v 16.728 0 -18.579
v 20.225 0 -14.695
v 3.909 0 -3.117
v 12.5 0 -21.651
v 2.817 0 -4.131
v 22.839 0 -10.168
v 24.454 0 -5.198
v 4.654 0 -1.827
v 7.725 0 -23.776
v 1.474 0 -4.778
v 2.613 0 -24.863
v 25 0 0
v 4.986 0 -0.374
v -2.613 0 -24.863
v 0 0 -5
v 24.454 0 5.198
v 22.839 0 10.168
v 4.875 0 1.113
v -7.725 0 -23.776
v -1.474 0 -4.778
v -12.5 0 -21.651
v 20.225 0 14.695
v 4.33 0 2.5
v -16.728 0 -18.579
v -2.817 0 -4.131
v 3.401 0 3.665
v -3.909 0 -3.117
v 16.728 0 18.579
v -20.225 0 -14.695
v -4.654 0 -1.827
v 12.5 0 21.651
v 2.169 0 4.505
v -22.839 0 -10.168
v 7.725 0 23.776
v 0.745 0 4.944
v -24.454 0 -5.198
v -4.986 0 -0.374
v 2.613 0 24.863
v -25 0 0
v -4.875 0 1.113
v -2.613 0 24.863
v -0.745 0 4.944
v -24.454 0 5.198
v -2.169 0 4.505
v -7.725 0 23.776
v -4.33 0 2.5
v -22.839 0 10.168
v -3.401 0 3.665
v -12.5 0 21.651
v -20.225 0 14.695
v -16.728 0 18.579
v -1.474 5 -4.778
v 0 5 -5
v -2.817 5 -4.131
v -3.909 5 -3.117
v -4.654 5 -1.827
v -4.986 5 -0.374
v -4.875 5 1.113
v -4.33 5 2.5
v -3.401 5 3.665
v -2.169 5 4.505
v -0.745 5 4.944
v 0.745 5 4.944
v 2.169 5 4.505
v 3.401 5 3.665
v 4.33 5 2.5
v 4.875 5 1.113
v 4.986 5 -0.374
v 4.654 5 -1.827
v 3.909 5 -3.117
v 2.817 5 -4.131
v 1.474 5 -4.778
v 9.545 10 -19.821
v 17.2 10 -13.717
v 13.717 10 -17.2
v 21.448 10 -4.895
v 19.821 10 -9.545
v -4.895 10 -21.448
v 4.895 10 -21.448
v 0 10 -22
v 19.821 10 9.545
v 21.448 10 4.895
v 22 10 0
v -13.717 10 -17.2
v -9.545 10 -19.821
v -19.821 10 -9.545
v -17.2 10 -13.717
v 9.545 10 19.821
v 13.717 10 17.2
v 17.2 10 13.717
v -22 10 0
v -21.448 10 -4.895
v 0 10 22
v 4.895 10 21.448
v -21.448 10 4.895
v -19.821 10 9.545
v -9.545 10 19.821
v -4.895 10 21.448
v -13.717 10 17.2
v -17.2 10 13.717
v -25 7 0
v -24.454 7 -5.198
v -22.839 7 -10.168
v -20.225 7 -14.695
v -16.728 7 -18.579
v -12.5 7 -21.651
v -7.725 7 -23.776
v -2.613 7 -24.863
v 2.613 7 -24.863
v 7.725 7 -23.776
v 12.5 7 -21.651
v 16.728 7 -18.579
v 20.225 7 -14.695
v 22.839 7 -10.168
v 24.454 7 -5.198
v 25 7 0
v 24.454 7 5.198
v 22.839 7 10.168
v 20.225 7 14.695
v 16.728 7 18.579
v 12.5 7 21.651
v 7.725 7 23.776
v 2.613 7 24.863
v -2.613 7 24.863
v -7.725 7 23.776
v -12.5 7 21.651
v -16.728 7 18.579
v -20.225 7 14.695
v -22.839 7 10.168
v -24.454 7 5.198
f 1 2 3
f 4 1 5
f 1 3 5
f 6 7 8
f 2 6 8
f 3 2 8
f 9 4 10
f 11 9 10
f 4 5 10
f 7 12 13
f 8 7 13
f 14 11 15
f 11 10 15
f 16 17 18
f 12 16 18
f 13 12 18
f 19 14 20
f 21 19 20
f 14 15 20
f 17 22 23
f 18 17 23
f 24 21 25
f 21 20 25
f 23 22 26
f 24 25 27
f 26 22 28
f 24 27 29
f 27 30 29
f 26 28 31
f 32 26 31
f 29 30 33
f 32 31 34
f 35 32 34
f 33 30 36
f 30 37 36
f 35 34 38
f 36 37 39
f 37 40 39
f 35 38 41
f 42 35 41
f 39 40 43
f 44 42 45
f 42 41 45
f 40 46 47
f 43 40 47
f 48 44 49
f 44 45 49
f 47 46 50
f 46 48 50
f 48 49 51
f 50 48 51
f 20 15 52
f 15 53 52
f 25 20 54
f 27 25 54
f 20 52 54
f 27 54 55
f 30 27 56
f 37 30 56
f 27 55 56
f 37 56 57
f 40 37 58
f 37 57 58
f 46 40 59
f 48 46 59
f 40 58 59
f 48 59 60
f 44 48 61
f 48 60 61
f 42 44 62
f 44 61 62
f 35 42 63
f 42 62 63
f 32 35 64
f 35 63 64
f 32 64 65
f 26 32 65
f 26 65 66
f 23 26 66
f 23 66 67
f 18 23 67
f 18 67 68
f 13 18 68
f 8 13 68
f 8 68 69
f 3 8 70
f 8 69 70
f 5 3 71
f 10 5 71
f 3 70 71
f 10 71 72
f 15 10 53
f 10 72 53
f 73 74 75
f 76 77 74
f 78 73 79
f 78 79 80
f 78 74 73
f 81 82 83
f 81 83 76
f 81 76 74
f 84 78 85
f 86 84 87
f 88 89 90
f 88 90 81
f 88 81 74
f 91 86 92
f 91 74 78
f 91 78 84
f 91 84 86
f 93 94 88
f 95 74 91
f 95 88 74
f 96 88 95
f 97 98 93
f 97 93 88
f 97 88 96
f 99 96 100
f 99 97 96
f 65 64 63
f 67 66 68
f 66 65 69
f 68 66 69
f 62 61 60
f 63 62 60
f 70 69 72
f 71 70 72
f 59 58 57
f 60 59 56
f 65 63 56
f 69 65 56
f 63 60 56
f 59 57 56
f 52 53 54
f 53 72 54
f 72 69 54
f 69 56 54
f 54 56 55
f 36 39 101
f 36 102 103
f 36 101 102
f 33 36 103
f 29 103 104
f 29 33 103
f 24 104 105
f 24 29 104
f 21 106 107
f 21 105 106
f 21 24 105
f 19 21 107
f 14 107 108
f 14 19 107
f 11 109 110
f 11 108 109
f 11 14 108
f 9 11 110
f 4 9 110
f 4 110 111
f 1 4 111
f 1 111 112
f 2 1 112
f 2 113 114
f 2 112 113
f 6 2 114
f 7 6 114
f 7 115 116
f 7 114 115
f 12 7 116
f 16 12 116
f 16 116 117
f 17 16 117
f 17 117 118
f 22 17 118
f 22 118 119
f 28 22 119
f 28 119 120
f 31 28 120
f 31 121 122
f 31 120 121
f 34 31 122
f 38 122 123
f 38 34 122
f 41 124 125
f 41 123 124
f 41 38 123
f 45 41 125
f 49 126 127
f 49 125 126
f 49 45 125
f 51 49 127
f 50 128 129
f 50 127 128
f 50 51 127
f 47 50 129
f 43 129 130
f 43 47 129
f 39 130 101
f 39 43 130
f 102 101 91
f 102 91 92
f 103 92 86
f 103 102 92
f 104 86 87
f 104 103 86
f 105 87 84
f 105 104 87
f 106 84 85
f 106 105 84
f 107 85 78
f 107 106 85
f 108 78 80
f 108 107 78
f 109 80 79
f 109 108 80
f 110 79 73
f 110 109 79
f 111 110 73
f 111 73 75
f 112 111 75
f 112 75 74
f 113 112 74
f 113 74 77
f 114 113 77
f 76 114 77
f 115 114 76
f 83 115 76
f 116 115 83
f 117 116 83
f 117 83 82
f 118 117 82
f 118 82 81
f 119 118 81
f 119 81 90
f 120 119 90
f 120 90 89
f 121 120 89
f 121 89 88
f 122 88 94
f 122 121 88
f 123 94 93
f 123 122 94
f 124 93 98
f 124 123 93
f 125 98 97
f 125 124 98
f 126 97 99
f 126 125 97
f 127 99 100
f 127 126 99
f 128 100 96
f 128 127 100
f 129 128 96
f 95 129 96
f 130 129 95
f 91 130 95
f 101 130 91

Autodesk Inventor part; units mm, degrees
ref_plane "YZ Plane" through (0, 0, 0) normal (1, 0, 0) x (0, 1, 0)
ref_plane "XZ Plane" through (0, 0, 0) normal (0, 1, 0) x (-1, 0, 0)
ref_plane "XY Plane" through (0, 0, 0) normal (0, 0, 1) x (1, 0, 0)
sketch "Sketch1" plane through (0, 0, 0) normal (0, 1, 0) x (-1, 0, 0)
  circle A0 centre (0, 0) radius 25
  dimension "d0" = 50
extrude "Extrusion1" add sketch "Sketch1" along normal blind 10
chamfer "Chamfer1" distance 3 angle 45 1 edges at (25, 10, 0)
hole "Hole1" at (0, 0, 0) direction (0, 1, 0) diameter 10 depth 5
properties part number "stackLightTop" material "ABS Plastic"
